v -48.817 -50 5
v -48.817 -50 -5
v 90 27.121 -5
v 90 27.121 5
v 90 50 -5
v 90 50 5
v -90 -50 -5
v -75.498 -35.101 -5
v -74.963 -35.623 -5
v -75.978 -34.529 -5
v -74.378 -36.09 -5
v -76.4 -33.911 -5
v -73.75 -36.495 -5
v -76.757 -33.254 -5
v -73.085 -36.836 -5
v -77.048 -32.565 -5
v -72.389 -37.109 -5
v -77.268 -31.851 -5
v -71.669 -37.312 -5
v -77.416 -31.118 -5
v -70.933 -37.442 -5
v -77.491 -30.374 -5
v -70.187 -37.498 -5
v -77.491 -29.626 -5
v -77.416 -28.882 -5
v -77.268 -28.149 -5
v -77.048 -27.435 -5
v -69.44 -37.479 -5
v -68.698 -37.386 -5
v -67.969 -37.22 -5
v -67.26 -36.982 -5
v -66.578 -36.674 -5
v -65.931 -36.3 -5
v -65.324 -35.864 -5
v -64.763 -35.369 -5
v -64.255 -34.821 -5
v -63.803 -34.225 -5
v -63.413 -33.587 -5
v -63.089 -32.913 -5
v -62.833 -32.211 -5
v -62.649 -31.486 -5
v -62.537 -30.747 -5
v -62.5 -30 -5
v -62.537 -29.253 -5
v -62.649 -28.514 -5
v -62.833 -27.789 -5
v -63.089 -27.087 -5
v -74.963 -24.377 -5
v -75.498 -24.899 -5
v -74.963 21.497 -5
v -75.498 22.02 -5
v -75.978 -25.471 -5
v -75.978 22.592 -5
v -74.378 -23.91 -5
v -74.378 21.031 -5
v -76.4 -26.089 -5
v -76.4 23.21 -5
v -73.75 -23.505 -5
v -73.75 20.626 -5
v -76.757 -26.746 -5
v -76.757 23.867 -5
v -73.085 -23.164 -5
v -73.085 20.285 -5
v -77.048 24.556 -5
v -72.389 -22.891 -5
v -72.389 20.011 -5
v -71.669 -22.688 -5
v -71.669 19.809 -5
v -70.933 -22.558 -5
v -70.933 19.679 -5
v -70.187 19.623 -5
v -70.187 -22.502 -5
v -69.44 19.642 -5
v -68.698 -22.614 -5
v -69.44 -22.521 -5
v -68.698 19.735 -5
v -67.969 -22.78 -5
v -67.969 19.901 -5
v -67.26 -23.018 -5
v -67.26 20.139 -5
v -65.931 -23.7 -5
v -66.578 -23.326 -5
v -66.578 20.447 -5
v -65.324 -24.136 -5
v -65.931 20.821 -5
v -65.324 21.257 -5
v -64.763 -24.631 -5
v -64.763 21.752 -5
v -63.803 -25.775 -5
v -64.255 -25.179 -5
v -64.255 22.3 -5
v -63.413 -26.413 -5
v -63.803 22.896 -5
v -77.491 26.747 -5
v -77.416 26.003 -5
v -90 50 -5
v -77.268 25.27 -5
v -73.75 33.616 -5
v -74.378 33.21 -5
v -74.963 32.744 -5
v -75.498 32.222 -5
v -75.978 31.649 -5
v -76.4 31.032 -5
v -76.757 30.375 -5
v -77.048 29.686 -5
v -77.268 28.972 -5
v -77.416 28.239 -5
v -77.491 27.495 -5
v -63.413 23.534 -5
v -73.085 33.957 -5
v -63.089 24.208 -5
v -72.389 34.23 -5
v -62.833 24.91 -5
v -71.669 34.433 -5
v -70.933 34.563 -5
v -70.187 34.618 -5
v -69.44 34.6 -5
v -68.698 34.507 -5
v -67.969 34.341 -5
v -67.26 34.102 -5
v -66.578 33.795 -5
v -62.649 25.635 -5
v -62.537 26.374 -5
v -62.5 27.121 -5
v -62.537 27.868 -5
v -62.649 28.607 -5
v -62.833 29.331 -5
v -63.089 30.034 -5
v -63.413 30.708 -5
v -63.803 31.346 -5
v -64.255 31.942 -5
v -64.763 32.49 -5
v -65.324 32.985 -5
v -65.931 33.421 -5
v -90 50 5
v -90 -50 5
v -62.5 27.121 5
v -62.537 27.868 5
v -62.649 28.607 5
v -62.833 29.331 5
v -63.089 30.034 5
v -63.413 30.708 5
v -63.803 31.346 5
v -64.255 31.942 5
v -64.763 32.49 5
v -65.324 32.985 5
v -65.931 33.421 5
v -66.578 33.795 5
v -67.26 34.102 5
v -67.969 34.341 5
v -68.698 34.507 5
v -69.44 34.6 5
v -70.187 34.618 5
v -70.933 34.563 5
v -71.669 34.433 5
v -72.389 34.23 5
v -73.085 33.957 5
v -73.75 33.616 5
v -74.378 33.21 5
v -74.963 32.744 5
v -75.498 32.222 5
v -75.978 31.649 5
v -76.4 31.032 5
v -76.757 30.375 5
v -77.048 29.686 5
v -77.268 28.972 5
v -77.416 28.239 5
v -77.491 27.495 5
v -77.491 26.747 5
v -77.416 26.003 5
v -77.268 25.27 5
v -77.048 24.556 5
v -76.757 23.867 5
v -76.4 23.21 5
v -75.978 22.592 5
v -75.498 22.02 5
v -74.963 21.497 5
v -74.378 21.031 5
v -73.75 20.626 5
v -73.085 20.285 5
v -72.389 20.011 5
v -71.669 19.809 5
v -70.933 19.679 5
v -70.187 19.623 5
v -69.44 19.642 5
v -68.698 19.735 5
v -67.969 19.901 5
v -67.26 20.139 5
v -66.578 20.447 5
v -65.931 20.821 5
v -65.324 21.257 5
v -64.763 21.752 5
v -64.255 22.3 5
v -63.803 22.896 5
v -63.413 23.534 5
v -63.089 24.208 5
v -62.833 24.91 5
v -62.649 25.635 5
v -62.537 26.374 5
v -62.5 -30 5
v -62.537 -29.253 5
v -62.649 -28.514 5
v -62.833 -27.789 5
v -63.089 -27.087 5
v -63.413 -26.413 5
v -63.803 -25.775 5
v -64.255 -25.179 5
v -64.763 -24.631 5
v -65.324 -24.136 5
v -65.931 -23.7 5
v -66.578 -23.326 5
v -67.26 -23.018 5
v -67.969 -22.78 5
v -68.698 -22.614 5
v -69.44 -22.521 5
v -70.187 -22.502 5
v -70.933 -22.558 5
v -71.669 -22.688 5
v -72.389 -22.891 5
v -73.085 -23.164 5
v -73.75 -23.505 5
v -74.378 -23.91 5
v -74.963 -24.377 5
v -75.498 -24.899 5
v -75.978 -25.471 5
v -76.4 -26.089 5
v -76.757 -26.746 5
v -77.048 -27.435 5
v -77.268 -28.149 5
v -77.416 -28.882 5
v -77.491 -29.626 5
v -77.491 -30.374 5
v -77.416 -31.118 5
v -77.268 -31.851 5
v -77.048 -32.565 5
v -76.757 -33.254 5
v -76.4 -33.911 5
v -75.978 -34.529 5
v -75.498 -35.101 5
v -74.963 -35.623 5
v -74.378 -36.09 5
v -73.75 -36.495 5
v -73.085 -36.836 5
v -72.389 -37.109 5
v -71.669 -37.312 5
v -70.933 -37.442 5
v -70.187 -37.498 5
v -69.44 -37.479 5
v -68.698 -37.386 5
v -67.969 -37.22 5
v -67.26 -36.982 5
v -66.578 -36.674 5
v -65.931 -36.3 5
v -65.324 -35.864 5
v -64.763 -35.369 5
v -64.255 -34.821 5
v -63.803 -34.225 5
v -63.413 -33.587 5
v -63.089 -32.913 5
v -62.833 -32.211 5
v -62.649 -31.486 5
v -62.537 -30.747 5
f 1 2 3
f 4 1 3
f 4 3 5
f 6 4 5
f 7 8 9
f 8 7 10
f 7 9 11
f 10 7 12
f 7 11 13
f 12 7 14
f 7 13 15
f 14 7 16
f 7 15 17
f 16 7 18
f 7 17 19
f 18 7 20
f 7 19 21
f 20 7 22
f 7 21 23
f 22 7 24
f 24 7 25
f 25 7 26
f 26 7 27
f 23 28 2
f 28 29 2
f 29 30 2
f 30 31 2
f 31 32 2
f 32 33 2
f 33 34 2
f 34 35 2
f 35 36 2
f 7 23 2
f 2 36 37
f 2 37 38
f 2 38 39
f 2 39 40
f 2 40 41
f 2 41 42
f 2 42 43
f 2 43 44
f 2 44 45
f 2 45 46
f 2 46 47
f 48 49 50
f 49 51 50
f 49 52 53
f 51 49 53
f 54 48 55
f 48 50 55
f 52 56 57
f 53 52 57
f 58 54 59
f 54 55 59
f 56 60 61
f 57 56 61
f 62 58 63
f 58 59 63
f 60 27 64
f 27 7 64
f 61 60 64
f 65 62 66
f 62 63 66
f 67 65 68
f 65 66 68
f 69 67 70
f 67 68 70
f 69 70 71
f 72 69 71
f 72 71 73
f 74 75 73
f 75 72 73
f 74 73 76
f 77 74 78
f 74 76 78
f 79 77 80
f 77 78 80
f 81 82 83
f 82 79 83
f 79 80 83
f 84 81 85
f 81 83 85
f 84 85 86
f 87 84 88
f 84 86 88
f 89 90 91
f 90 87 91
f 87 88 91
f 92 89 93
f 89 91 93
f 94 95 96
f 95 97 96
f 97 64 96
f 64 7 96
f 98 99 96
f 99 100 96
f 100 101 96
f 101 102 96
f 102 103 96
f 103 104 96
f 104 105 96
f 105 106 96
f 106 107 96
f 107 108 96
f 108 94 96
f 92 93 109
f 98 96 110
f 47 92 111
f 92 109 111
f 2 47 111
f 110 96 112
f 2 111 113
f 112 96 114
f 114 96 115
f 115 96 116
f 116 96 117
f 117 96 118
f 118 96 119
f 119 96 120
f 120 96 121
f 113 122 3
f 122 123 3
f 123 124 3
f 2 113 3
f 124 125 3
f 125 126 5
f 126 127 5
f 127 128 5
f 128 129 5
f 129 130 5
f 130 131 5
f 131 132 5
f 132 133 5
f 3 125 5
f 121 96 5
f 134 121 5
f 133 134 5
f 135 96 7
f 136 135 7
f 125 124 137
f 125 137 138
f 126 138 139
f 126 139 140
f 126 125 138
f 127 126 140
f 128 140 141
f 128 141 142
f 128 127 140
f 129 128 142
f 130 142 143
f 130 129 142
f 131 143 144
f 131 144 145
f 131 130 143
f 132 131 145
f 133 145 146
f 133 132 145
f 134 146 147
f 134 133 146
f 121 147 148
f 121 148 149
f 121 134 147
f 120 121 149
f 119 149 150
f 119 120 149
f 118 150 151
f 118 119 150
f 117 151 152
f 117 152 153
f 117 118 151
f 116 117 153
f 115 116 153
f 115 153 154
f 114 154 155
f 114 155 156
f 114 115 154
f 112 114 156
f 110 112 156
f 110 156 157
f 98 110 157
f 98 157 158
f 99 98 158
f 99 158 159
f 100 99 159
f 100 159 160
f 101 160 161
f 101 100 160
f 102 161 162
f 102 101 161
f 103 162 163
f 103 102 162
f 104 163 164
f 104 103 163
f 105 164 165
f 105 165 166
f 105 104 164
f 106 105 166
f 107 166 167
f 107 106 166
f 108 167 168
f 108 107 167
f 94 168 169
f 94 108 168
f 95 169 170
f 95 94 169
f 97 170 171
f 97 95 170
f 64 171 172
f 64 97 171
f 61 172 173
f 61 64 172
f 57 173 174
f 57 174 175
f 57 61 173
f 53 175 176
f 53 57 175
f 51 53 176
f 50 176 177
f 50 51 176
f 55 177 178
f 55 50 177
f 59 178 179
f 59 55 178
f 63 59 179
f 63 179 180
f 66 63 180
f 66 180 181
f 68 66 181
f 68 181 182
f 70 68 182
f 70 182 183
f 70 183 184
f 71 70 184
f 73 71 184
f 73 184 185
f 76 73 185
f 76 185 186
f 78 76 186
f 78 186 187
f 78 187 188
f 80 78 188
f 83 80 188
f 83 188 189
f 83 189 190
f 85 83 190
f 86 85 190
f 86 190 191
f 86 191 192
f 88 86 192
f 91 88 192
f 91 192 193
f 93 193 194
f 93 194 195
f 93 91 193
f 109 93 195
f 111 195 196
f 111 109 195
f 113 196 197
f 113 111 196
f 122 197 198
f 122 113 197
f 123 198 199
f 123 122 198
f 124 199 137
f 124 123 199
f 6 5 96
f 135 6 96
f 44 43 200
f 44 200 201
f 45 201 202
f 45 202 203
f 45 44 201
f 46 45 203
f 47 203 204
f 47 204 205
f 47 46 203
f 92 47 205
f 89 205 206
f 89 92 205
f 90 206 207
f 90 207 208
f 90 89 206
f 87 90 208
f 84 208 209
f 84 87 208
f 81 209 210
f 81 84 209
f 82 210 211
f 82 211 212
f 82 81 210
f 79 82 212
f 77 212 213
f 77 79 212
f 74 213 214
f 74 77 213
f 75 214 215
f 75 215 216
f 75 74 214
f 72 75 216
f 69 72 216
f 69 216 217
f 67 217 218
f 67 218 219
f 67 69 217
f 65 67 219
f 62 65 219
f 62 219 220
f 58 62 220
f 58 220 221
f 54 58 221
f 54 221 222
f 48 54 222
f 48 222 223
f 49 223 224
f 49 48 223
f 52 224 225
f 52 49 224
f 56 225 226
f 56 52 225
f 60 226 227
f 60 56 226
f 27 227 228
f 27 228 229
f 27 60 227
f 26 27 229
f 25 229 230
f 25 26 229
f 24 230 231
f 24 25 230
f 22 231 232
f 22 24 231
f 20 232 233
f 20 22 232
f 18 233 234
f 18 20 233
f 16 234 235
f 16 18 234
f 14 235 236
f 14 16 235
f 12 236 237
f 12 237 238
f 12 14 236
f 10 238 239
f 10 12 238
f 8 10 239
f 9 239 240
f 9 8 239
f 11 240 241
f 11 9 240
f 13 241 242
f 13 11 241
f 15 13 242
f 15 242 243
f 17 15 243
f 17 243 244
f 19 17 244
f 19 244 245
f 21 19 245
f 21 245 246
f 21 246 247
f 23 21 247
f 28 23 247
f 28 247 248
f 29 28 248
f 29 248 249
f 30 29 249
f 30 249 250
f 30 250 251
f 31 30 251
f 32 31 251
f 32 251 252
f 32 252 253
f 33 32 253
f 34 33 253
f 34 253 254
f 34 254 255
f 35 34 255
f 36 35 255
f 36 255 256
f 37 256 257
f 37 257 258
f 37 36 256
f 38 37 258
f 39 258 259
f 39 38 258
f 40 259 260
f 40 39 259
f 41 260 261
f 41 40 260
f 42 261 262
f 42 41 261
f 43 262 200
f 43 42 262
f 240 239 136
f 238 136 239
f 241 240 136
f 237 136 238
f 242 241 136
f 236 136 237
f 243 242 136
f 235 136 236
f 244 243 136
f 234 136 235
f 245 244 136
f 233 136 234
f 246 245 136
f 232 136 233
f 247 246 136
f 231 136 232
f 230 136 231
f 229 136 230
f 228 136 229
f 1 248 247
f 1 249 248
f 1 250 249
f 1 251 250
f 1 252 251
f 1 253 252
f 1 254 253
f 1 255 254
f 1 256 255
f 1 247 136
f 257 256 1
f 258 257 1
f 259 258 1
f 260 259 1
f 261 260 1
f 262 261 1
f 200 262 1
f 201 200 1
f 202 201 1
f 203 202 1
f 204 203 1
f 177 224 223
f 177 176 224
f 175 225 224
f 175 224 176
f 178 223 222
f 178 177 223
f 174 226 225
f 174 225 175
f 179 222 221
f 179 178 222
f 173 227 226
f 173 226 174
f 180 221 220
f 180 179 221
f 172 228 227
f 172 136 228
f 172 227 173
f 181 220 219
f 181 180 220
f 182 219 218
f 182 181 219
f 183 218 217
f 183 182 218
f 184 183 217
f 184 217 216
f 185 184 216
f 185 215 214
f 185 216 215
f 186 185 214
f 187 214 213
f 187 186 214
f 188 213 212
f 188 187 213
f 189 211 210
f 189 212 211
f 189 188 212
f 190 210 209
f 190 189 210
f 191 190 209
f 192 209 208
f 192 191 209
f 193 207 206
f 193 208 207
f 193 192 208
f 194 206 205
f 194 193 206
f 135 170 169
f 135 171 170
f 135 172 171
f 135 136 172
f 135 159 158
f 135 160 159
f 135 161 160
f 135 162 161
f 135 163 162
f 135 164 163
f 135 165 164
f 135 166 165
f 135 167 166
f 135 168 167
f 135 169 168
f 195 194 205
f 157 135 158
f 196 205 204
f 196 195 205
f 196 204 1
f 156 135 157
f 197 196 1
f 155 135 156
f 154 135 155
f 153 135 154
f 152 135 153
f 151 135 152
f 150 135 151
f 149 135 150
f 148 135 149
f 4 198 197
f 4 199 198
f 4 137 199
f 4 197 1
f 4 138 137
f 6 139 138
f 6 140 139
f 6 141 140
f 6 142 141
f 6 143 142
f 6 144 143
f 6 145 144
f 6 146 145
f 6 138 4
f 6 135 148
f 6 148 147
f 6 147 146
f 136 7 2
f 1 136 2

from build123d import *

# Parameters (mm, degrees)
BOSS_EXTRUDE1_DEPTH      = 5
BOSS_EXTRUDE1_DEPTH_BACK = 5
SKETCH1_R                = 7.5


with BuildPart() as part:
    # Sketch1 → Boss-Extrude1 (new, two sides: drawn at the far end of the back side and taken through both)
    with BuildSketch(Plane.XY.offset(-BOSS_EXTRUDE1_DEPTH_BACK)):
        Polygon((-90, -50), (-48.817479436, -50), (90, 27.120821909), (90, 50), (-90, 50), align=None)
        with Locations((-70, 27.120821909)):
            Circle(SKETCH1_R, mode=Mode.SUBTRACT)
        with Locations((-70, -30)):
            Circle(SKETCH1_R, mode=Mode.SUBTRACT)
    extrude(amount=BOSS_EXTRUDE1_DEPTH + BOSS_EXTRUDE1_DEPTH_BACK)


solid = part.part
